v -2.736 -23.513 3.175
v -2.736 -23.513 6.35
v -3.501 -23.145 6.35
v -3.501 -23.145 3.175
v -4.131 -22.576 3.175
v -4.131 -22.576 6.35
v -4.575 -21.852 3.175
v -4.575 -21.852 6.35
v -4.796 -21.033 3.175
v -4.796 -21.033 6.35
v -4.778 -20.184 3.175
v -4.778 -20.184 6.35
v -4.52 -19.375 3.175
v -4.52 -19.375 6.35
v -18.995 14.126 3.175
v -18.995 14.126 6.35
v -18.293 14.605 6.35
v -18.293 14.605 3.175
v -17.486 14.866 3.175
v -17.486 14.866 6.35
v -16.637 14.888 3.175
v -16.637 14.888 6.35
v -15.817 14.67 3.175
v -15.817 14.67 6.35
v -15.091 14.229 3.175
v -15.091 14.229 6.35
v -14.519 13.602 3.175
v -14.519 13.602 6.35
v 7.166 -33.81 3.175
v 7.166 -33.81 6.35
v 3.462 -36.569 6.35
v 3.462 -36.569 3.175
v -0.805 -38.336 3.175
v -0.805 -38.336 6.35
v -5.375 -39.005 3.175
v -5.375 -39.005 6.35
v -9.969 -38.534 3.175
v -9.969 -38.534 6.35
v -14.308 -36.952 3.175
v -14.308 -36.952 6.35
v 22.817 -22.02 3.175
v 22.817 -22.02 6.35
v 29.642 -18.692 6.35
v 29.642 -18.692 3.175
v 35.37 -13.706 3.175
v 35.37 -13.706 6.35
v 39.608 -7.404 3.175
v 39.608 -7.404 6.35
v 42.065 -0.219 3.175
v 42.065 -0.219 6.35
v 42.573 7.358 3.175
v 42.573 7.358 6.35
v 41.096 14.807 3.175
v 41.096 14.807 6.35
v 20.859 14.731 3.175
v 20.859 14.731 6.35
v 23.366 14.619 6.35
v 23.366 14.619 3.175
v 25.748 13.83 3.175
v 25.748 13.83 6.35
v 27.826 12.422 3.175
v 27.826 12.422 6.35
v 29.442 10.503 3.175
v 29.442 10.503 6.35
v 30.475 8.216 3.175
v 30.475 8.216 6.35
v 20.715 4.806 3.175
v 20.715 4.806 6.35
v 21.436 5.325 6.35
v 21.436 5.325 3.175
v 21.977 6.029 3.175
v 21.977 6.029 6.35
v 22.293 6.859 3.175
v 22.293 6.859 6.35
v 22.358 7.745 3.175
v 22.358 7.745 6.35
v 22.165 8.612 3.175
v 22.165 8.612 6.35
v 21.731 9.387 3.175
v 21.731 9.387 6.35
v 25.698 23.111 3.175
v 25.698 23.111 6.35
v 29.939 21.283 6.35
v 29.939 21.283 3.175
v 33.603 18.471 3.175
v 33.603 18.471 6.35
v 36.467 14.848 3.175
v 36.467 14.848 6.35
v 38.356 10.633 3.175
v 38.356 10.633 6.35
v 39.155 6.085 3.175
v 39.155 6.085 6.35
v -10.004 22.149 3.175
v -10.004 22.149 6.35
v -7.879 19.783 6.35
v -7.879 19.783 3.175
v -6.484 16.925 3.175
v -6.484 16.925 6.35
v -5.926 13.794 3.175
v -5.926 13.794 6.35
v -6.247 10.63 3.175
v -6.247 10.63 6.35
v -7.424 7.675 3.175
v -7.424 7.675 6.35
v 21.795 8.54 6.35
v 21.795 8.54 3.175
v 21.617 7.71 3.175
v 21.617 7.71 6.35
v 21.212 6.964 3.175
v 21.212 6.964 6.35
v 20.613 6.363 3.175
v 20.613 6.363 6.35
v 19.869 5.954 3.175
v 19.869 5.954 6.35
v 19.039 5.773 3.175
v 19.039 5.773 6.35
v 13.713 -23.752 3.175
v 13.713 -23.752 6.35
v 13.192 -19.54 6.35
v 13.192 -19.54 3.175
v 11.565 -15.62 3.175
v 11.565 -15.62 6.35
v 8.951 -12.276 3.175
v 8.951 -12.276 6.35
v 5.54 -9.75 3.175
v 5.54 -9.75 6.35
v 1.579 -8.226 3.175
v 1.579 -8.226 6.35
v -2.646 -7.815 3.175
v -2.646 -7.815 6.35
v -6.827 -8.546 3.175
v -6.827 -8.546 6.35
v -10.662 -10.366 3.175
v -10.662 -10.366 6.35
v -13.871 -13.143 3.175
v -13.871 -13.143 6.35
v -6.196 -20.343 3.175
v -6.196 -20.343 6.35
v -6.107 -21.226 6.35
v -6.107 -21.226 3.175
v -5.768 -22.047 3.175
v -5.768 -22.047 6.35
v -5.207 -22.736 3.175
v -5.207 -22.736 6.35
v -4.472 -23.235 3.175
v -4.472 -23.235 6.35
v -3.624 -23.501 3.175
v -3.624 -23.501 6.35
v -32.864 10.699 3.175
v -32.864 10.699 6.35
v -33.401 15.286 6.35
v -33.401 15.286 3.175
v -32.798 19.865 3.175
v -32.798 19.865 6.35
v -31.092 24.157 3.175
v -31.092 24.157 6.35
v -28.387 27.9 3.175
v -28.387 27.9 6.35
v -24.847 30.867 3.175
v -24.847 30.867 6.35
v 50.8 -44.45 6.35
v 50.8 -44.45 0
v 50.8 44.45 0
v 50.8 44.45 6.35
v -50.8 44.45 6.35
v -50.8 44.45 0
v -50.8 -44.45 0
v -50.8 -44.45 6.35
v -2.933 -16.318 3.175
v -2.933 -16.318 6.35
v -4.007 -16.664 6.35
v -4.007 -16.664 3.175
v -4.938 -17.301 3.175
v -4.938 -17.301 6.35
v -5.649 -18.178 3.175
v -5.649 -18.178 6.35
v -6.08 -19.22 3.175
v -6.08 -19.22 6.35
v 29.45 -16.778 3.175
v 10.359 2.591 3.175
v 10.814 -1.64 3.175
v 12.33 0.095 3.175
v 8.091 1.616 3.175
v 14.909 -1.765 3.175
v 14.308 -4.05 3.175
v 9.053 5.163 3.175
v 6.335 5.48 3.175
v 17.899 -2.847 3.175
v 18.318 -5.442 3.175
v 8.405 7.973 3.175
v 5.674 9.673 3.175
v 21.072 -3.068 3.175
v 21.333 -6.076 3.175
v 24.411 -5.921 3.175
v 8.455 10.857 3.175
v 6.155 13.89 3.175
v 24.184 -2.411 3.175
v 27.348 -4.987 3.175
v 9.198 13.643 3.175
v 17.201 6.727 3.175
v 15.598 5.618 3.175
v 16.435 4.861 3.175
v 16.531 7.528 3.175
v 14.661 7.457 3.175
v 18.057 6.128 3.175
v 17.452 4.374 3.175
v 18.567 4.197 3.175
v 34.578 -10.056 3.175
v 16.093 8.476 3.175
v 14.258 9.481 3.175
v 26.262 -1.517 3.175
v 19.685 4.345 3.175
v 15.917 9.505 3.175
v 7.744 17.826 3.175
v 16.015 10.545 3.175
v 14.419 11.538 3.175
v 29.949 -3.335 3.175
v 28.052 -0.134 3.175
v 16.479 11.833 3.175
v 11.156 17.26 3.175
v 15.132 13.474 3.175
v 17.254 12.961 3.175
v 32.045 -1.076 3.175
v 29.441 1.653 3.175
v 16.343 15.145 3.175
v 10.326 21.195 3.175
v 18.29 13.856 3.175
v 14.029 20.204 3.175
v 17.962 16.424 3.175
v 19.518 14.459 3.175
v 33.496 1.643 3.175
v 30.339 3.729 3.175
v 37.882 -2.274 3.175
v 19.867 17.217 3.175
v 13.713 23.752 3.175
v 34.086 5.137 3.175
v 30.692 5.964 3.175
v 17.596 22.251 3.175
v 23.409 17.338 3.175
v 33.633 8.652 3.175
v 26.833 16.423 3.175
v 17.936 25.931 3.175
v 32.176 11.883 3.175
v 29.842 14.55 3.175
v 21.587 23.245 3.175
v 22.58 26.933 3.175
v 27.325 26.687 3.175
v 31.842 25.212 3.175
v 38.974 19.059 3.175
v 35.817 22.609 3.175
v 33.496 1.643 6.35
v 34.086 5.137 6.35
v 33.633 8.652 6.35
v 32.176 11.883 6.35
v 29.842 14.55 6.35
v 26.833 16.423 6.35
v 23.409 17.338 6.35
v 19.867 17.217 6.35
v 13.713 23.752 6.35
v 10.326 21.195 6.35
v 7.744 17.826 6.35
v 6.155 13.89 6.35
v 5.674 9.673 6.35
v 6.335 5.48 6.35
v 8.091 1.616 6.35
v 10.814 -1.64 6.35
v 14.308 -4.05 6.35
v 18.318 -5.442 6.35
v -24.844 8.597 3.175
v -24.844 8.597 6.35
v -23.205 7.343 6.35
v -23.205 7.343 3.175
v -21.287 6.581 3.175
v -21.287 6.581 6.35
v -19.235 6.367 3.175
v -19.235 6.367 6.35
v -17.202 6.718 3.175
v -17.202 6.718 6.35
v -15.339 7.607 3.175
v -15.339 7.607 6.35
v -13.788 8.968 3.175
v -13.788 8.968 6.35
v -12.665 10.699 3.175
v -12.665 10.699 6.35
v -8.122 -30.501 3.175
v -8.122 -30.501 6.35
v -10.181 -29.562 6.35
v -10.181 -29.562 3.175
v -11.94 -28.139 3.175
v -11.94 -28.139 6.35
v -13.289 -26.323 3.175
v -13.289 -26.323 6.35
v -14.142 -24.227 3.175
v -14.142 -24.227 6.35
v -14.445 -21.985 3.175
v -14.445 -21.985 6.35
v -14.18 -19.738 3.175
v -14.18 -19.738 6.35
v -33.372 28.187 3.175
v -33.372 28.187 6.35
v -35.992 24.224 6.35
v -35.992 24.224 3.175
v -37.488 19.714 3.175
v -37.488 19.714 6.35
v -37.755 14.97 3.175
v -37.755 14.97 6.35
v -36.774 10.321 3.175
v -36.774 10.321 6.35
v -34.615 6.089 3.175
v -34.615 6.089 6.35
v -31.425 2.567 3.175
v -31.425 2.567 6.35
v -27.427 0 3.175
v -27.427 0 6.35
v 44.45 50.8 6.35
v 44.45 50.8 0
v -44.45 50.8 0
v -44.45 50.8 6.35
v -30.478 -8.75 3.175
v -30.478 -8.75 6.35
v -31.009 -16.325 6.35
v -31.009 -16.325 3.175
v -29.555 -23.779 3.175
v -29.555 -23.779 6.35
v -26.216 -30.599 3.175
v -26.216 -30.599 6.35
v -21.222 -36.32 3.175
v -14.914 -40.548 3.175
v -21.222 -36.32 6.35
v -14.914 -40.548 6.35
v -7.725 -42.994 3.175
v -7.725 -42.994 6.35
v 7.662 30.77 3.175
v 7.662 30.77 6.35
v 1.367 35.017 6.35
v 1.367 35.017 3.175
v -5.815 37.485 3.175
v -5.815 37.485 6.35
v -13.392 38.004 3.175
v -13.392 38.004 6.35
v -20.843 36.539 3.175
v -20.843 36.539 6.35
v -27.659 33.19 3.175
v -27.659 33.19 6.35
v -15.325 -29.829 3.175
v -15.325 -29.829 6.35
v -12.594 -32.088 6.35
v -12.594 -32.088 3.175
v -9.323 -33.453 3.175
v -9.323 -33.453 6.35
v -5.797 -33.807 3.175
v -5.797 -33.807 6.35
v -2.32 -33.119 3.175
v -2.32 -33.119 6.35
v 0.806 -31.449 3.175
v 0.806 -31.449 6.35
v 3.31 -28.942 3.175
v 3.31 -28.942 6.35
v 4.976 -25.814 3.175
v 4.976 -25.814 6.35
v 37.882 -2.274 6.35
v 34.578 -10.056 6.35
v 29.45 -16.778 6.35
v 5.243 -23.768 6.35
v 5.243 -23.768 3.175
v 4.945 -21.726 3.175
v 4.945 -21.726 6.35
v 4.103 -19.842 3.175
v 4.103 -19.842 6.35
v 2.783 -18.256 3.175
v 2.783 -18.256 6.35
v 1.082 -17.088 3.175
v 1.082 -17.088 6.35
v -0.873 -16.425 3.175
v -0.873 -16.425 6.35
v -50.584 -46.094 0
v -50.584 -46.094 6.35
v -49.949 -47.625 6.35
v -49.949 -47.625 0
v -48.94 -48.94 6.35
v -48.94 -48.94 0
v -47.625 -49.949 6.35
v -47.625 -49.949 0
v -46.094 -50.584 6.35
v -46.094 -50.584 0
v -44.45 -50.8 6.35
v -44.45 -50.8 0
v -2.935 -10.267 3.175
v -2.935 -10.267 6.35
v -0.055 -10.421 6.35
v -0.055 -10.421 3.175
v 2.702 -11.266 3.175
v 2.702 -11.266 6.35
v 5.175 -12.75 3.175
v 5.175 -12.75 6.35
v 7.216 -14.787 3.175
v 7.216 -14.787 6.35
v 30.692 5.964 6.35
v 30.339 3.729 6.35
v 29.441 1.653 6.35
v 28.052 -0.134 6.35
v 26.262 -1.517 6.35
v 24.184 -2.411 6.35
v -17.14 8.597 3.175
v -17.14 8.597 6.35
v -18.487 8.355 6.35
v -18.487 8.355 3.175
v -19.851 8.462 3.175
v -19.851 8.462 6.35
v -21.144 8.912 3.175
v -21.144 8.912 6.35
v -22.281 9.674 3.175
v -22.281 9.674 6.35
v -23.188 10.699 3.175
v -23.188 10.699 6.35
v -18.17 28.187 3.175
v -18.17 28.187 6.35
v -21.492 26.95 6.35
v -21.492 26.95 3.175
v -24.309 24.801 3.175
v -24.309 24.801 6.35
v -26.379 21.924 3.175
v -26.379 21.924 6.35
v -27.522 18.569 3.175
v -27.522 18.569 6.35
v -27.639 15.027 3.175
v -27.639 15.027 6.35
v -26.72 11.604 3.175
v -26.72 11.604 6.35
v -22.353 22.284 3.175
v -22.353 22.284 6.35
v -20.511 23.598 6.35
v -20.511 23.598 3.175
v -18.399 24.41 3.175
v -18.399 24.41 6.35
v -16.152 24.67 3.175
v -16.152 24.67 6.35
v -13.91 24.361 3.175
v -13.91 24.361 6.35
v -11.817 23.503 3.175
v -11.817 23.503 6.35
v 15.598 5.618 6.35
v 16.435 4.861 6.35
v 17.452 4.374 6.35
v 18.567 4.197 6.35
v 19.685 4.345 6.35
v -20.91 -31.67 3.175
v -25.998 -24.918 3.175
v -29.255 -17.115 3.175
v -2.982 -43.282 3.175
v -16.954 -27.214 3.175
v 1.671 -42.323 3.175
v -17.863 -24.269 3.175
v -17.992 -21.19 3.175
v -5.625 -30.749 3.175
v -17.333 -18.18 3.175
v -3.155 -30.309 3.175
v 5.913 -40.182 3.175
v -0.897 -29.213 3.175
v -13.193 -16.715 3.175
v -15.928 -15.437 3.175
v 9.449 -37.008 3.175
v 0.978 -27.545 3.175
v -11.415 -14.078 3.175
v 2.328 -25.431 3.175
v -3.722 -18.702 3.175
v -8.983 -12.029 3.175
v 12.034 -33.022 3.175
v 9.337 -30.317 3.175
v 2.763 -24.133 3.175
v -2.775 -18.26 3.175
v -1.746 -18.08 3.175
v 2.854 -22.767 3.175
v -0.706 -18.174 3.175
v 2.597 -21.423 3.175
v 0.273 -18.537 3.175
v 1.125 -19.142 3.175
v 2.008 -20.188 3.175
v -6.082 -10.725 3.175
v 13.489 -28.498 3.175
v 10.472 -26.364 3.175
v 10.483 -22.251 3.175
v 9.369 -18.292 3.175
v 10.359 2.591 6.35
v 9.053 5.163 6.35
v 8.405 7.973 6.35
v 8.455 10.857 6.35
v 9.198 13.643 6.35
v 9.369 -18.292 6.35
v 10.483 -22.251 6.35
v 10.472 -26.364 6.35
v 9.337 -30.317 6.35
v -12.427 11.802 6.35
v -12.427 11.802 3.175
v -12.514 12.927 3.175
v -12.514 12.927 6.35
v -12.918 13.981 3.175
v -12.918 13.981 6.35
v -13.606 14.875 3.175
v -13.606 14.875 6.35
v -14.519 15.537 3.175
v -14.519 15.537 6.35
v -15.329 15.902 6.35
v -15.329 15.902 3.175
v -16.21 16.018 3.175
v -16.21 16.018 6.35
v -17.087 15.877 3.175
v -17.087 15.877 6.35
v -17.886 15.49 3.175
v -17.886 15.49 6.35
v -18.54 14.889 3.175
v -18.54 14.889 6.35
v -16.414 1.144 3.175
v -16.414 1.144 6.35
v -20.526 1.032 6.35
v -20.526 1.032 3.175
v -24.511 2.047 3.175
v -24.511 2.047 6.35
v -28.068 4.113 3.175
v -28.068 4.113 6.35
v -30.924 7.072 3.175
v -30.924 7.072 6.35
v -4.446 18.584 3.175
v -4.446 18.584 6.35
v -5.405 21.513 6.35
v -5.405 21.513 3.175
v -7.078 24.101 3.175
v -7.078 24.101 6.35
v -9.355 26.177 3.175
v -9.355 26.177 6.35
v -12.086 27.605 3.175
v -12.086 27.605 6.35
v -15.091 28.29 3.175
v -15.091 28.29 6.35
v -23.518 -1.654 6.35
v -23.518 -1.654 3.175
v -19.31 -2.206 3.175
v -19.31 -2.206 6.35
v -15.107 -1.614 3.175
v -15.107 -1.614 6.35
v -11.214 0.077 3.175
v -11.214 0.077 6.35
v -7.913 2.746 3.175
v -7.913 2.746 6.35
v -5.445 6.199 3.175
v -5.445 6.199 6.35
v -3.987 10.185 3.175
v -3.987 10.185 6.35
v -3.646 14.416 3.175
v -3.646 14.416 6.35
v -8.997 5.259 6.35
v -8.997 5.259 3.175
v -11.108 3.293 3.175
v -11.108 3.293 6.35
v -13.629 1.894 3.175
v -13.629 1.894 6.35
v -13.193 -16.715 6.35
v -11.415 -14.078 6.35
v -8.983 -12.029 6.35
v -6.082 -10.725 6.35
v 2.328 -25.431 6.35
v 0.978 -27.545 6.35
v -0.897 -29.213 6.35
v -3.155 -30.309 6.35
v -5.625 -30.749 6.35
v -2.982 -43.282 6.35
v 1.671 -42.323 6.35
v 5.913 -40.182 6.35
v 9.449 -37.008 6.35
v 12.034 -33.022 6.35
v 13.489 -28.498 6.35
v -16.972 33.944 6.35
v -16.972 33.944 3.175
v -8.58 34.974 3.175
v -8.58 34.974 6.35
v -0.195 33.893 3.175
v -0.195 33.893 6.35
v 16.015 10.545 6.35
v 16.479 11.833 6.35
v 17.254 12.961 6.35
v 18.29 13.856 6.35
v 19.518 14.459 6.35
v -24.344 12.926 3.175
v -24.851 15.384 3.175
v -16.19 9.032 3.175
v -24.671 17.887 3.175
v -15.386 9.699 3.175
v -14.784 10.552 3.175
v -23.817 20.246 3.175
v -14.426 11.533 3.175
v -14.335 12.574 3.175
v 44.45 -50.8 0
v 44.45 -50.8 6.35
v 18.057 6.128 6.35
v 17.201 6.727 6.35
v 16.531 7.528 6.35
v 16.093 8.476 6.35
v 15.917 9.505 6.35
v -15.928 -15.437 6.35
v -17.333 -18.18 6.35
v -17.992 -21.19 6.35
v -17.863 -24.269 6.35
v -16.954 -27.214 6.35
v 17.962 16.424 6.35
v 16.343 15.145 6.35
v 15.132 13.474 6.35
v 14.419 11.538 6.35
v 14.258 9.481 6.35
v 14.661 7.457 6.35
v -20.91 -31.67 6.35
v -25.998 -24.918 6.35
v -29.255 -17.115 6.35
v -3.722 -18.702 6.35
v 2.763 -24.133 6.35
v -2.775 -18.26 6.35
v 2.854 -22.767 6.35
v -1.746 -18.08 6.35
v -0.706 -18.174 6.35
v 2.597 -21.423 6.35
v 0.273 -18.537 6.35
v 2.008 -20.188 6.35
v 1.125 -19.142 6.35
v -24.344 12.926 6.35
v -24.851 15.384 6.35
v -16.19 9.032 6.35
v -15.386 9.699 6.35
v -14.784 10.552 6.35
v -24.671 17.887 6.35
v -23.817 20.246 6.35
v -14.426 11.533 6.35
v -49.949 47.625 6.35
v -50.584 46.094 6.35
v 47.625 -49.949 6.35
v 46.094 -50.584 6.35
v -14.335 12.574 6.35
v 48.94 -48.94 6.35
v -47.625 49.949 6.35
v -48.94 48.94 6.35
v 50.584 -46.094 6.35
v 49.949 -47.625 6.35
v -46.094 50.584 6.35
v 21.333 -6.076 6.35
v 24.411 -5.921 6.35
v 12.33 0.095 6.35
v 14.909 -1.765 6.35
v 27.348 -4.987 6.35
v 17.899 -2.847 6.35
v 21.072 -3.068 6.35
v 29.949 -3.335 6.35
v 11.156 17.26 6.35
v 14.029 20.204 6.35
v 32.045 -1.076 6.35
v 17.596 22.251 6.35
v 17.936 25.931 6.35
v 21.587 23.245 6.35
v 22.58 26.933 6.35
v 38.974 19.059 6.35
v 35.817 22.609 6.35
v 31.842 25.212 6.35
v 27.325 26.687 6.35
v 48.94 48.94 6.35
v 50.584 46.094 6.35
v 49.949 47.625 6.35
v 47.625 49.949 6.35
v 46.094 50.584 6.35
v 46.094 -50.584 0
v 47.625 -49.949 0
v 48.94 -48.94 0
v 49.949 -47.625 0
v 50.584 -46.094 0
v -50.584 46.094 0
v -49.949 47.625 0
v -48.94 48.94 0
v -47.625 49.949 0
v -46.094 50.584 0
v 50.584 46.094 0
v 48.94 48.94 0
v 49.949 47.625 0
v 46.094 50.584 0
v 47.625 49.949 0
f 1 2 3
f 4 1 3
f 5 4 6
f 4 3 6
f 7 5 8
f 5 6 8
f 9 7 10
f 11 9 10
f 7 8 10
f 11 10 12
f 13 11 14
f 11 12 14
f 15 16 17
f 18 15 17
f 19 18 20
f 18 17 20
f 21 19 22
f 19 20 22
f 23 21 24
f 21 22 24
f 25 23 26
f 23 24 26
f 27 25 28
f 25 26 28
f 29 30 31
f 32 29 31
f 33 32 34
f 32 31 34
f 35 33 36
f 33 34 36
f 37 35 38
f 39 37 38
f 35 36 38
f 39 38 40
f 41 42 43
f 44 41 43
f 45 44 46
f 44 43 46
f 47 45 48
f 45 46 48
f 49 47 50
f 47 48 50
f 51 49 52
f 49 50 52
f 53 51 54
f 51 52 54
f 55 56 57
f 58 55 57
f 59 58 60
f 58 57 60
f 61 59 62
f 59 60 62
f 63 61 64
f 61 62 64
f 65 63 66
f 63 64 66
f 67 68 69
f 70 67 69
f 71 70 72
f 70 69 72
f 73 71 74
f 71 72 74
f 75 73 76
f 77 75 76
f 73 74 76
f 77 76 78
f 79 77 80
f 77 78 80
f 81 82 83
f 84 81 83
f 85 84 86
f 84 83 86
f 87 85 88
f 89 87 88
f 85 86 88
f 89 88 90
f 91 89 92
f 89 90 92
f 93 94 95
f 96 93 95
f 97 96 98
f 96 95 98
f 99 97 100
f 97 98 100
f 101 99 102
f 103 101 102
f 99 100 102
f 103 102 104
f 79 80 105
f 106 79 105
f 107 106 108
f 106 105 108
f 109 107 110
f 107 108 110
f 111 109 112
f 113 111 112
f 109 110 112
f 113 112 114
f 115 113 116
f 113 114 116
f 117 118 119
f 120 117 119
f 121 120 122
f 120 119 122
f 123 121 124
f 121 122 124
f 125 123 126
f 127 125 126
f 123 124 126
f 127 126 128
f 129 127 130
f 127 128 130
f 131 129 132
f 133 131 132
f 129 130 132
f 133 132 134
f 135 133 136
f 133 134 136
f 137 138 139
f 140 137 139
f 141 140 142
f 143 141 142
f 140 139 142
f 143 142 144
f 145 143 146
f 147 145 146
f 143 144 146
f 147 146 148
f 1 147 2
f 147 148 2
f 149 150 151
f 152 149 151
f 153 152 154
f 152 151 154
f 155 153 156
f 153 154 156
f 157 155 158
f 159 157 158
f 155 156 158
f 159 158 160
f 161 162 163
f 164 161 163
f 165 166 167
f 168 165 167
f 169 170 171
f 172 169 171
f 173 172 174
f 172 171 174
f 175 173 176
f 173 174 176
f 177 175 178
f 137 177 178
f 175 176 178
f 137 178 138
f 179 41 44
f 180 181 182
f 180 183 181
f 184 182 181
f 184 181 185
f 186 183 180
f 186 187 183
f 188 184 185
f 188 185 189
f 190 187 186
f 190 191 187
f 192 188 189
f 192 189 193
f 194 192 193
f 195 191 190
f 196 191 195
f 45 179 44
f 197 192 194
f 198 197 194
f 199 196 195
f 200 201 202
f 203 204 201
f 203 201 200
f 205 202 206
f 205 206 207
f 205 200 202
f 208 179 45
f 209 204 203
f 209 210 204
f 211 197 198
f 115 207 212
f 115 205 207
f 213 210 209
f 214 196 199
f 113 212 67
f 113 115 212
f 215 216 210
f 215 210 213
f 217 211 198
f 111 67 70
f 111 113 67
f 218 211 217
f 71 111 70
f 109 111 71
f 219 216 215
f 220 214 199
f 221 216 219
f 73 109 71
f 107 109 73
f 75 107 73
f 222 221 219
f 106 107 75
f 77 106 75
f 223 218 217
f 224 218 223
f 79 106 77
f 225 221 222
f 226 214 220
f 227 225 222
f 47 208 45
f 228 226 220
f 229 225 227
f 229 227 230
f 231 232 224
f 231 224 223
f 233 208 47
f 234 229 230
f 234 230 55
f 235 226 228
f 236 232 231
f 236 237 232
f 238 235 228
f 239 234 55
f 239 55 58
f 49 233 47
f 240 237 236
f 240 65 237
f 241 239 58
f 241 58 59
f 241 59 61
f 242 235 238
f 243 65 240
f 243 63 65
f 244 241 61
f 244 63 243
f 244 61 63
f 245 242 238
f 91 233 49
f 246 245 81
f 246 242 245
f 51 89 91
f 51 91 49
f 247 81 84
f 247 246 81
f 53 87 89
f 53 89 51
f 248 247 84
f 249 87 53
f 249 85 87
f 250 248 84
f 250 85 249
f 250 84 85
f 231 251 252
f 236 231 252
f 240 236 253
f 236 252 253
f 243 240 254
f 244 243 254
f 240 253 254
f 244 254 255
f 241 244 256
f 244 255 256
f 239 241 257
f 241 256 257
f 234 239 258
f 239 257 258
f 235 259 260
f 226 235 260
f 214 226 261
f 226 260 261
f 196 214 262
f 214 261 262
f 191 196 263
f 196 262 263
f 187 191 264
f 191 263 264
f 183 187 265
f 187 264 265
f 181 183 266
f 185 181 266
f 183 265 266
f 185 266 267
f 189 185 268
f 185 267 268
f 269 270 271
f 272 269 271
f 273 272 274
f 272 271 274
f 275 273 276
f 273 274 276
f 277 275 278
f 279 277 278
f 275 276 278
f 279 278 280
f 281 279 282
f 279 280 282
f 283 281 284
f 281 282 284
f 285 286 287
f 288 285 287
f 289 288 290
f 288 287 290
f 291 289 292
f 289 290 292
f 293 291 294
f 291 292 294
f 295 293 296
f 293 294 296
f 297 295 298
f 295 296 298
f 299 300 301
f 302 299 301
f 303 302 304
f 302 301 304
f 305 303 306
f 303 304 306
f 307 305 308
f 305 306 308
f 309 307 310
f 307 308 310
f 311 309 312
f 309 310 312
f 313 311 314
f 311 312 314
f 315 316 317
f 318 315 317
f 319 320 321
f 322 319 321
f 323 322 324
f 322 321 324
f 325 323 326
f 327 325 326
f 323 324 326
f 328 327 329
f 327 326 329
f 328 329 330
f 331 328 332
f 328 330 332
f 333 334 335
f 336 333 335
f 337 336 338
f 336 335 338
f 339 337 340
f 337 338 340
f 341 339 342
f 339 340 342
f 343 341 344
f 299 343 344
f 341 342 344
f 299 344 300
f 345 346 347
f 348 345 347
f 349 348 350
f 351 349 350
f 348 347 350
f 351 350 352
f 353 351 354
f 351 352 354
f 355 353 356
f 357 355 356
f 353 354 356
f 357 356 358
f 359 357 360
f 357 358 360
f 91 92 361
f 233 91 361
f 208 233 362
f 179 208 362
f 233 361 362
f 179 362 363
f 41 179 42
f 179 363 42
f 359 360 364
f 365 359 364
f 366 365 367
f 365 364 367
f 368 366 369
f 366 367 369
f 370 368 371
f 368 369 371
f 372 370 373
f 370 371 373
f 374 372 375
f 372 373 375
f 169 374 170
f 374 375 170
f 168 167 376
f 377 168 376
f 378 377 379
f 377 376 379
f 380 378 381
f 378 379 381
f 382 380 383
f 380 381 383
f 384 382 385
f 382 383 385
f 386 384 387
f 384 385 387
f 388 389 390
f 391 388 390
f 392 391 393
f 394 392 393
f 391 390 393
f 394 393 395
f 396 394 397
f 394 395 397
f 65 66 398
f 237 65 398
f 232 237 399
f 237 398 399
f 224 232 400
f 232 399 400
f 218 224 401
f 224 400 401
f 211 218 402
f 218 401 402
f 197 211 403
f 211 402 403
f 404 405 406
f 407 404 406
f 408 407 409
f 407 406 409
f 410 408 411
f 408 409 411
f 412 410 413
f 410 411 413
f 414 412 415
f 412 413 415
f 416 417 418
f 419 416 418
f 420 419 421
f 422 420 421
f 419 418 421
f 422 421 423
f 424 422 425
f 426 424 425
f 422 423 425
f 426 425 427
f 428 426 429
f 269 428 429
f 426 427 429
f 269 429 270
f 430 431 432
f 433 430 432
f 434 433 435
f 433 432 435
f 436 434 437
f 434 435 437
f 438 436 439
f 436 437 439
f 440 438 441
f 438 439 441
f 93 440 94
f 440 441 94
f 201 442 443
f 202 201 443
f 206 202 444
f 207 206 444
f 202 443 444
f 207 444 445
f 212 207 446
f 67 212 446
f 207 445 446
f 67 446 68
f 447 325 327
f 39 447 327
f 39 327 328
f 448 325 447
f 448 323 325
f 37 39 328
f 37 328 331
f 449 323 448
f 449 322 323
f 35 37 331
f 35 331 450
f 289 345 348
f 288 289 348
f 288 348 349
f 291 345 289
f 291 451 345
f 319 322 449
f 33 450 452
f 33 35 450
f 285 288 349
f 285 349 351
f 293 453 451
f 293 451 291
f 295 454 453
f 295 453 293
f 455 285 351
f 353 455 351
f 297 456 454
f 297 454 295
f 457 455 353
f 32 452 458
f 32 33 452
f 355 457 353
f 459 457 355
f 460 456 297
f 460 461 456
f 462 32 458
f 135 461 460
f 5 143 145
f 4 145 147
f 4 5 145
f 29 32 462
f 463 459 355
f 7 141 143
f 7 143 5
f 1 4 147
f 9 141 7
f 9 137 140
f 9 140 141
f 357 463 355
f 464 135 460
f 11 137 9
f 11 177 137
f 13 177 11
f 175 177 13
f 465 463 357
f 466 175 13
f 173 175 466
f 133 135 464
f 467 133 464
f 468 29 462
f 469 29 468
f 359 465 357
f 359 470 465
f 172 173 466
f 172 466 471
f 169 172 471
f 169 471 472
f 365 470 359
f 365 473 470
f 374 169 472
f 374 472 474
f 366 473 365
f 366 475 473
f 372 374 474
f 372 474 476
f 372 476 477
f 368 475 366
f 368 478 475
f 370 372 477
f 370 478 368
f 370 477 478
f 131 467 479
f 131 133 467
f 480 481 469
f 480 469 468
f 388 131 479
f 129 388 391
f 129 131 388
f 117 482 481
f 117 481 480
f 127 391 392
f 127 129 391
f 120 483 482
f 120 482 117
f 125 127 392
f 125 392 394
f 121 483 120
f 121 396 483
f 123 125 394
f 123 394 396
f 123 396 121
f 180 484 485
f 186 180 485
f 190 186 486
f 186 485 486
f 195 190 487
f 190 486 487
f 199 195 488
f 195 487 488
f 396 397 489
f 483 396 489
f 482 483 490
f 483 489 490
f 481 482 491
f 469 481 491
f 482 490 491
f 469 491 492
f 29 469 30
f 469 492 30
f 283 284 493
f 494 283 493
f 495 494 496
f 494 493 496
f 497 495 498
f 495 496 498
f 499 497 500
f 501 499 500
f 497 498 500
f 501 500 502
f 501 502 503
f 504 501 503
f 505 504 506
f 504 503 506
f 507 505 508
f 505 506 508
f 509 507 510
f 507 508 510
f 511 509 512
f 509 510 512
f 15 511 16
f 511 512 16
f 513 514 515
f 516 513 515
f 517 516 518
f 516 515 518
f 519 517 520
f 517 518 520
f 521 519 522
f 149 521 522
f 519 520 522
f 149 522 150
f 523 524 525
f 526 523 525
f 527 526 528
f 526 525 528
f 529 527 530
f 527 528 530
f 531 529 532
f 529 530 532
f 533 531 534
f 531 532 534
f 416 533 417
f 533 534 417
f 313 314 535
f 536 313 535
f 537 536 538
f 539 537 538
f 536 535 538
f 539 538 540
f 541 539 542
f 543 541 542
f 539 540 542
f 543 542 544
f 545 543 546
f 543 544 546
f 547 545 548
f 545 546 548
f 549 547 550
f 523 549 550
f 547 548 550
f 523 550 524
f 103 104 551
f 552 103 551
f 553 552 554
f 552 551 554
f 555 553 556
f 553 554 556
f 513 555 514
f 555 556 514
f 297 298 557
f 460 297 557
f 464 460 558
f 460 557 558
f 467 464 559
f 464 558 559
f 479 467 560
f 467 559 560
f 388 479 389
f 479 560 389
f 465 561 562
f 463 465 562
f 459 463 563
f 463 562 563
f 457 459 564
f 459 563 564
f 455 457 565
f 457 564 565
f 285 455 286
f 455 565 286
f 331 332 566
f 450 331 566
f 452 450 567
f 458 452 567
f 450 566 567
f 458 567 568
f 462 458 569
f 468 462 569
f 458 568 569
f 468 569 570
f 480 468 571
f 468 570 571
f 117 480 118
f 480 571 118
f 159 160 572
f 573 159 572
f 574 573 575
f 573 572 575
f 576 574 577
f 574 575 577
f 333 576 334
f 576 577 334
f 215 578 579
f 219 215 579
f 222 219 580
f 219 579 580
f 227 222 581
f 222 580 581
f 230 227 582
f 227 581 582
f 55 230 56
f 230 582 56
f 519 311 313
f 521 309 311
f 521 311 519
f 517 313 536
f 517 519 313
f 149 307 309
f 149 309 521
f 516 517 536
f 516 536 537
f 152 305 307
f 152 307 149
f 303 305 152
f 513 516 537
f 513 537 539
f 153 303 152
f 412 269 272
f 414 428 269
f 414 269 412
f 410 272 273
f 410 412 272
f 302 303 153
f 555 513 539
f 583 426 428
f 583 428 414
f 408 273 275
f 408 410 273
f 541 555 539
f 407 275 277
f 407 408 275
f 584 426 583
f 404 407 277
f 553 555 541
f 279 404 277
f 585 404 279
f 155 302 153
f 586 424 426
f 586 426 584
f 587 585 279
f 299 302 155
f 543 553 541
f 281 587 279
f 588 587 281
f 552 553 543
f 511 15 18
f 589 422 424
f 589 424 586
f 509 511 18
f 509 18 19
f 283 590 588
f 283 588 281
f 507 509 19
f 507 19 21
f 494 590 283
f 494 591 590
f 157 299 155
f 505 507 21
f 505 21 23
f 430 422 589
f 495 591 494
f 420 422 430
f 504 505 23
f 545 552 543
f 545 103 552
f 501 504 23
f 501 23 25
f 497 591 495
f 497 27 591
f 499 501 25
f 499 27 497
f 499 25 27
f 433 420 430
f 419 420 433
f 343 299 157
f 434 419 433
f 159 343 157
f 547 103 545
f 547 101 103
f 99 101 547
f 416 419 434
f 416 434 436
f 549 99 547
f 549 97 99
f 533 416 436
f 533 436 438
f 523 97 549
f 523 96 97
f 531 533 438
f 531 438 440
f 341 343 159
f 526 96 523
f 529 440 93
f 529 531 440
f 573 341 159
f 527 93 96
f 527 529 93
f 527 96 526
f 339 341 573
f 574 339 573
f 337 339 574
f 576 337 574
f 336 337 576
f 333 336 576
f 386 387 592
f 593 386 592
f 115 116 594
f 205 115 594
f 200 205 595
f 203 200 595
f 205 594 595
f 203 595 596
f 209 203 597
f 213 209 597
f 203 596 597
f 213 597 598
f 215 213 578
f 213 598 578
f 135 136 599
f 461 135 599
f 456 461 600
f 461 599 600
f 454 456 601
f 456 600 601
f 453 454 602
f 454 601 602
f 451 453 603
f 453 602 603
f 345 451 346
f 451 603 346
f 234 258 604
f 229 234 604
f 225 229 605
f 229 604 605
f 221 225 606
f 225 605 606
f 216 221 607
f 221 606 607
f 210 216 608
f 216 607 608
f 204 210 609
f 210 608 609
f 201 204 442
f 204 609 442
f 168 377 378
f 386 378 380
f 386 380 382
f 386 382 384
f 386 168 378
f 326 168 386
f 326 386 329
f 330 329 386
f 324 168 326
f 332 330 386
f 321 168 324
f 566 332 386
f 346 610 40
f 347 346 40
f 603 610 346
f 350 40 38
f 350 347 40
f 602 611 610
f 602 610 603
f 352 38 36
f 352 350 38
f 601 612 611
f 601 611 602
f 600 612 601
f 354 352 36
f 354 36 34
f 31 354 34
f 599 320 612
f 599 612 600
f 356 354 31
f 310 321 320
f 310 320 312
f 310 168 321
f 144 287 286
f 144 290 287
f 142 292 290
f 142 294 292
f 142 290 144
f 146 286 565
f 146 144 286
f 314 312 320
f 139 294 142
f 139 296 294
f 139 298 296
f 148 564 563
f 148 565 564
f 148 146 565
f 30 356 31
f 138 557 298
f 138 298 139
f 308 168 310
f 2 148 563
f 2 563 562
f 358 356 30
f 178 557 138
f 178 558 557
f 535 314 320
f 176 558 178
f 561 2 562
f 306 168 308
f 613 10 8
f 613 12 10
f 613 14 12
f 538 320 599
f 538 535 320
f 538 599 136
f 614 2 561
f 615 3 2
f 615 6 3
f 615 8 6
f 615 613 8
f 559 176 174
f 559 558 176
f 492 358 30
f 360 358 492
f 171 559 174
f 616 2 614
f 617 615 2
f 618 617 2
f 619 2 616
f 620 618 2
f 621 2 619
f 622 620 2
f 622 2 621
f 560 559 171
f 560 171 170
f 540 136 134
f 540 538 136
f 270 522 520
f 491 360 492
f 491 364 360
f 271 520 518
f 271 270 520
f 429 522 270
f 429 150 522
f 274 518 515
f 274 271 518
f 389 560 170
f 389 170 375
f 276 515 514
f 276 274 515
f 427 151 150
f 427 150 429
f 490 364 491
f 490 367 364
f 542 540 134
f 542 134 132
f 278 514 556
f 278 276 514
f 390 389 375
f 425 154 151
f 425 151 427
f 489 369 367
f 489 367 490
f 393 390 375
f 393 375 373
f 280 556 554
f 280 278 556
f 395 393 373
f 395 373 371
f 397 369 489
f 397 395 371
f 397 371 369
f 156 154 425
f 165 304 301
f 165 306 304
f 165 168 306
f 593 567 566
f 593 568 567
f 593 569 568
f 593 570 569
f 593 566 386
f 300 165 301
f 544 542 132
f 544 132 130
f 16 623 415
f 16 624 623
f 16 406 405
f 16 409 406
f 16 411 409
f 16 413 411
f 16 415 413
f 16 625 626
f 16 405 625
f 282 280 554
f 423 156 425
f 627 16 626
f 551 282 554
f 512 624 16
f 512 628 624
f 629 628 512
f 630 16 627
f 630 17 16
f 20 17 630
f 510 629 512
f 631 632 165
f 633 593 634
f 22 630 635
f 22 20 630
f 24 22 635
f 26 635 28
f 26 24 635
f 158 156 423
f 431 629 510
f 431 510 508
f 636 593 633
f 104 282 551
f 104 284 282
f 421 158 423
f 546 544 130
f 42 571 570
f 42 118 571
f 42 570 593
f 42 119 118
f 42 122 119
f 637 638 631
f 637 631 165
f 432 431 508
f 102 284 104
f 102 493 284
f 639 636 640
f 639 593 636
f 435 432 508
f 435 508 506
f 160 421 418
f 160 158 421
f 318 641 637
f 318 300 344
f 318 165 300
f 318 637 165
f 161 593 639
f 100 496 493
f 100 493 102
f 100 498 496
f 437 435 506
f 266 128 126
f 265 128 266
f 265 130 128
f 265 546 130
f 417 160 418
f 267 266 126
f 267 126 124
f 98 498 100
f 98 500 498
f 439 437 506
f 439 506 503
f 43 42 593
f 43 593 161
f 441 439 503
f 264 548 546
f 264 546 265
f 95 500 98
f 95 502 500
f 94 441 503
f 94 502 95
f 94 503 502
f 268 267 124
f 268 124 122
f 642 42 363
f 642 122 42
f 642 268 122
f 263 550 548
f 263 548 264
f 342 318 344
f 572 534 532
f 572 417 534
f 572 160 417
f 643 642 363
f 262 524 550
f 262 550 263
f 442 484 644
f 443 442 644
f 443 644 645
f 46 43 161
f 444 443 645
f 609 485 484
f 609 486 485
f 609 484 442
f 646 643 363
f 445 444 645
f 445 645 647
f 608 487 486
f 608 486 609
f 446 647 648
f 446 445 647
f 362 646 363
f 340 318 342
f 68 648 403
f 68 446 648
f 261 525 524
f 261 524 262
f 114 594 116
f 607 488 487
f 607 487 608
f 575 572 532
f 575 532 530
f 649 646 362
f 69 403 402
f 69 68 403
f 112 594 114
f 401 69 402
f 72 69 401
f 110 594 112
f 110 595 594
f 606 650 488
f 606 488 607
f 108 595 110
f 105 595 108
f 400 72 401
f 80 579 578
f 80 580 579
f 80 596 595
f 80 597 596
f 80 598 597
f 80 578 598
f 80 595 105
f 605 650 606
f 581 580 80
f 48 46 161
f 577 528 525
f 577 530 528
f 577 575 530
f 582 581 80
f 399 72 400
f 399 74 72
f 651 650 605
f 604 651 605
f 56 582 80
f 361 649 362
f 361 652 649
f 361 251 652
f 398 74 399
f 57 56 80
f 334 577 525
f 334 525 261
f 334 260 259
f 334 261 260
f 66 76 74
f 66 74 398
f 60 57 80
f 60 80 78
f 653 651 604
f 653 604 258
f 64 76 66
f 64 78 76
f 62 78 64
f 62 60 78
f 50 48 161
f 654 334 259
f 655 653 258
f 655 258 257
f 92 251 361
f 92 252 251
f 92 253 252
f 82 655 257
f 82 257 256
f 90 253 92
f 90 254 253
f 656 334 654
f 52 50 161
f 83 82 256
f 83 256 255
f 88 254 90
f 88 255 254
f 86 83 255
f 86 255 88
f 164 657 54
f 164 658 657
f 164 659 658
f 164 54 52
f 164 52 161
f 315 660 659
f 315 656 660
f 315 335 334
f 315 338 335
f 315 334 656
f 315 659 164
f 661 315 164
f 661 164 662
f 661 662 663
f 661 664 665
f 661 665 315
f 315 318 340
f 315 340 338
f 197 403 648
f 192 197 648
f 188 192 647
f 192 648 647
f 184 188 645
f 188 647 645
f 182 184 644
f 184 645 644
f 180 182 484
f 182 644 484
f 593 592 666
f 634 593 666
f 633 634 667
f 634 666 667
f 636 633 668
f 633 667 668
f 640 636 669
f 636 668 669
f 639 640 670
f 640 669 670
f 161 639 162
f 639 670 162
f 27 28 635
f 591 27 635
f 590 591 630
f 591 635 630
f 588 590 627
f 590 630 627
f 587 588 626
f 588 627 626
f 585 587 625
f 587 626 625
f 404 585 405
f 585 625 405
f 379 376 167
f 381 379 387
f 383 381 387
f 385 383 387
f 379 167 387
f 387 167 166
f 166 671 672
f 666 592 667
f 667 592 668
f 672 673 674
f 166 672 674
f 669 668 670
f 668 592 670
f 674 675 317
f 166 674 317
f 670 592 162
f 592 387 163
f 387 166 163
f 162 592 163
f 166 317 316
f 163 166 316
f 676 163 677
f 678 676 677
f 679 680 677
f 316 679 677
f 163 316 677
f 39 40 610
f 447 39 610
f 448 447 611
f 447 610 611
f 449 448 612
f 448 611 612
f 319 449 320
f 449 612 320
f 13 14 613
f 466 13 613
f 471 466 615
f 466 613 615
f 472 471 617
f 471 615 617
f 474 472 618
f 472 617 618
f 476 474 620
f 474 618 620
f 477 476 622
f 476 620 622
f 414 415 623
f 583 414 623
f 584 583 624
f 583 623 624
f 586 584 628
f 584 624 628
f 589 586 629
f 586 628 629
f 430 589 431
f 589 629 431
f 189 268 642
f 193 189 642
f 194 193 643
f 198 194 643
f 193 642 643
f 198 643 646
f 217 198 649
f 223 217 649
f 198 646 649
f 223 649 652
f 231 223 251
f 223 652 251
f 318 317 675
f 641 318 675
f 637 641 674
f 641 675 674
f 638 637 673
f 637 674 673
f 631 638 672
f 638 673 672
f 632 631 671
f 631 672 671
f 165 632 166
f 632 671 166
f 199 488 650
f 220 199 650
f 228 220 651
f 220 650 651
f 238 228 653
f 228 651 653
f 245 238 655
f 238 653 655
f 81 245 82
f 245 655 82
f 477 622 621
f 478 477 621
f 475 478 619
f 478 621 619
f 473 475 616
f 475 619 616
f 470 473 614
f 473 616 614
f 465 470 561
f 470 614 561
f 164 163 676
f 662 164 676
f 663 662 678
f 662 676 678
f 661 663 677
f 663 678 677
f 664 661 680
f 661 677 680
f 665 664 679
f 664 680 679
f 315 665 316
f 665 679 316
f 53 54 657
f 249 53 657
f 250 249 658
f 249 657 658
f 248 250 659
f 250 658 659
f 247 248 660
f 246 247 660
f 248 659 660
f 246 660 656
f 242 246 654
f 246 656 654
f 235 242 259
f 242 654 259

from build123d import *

# Parameters (mm, degrees)
F1_DEPTH = 6.35
F3_DEPTH = 3.175


with BuildPart() as f1:
    # F0 (on Top) → F1 (new body)
    with BuildSketch(Plane.XY):
        with BuildLine():
            Line((44.45, 50.8), (-44.45, 50.8))
            ThreePointArc((-44.45, 50.8), (-48.940128, 48.940128), (-50.8, 44.45))
            Line((-50.8, 44.45), (-50.8, -44.45))
            ThreePointArc((-50.8, -44.45), (-48.940128, -48.940128), (-44.45, -50.8))
            Line((-44.45, -50.8), (44.45, -50.8))
            ThreePointArc((44.45, -50.8), (48.940128, -48.940128), (50.8, -44.45))
            Line((50.8, -44.45), (50.8, 44.45))
            ThreePointArc((50.8, 44.45), (48.940128, 48.940128), (44.45, 50.8))
        make_face()
    extrude(amount=F1_DEPTH)

    # F2 (on face) → F3 (cut)
    with BuildSketch(Plane.XY.offset(6.35)):
        with BuildLine():
            ThreePointArc((-24.847122, 30.86718), (-8.580237, 34.973614), (7.661782, 30.769903))
            ThreePointArc((7.661782, 30.769903), (-13.391629, 38.003846), (-33.371605, 28.186688))
            ThreePointArc((-33.371605, 28.186688), (-37.418416, 12.612971), (-27.426904, 0))
            ThreePointArc((-27.426904, 0), (-9.473393, 1.300027), (-4.446225, 18.584304))
            ThreePointArc((-4.446225, 18.584304), (-9.355194, 26.176966), (-18.170381, 28.186688))
            ThreePointArc((-18.170381, 28.186688), (-27.074817, 20.28871), (-24.843689, 8.597298))
            ThreePointArc((-24.843689, 8.597298), (-18.2062, 6.472593), (-12.664793, 10.699108))
            ThreePointArc((-12.664793, 10.699108), (-12.67809, 13.468506), (-14.519384, 15.537172))
            ThreePointArc((-14.519384, 15.537172), (-17.08667, 15.877181), (-18.994594, 14.12607))
            ThreePointArc((-18.994594, 14.12607), (-16.63705, 14.888107), (-14.519384, 13.601947))
            ThreePointArc((-14.519384, 13.601947), (-14.784471, 10.552305), (-17.140003, 8.597298))
            ThreePointArc((-17.140003, 8.597298), (-20.512291, 8.645462), (-23.187581, 10.699108))
            ThreePointArc((-23.187581, 10.699108), (-24.847122, 16.641338), (-22.353067, 22.284373))
            ThreePointArc((-22.353067, 22.284373), (-16.15161, 24.669828), (-10.003858, 22.149192))
            ThreePointArc((-10.003858, 22.149192), (-6.096197, 15.378887), (-7.423557, 7.675318))
            ThreePointArc((-7.423557, 7.675318), (-11.107583, 3.292778), (-16.414292, 1.143932))
            ThreePointArc((-16.414292, 1.143932), (-26.36106, 2.956962), (-32.86371, 10.699108))
            ThreePointArc((-32.86371, 10.699108), (-32.077882, 22.064039), (-24.847122, 30.86718))
        make_face()
        with BuildLine():
            ThreePointArc((-14.179834, -19.738191), (-10.270408, -12.968905), (-2.935242, -10.266648))
            ThreePointArc((-2.935242, -10.266648), (2.702162, -11.265838), (7.216472, -14.78716))
            ThreePointArc((7.216472, -14.78716), (10.619726, -24.307829), (7.166156, -33.810362))
            ThreePointArc((7.166156, -33.810362), (-3.069077, -38.81228), (-14.308201, -36.951829))
            ThreePointArc((-14.308201, -36.951829), (-25.997919, -24.91751), (-30.478409, -8.749654))
            ThreePointArc((-30.478409, -8.749654), (-26.216482, -30.599414), (-7.724586, -42.994002))
            ThreePointArc((-7.724586, -42.994002), (7.786055, -38.711784), (13.713452, -23.752396))
            ThreePointArc((13.713452, -23.752396), (3.61084, -8.854213), (-13.871366, -13.142696))
            ThreePointArc((-13.871366, -13.142696), (-17.992321, -21.190319), (-15.325198, -29.829356))
            ThreePointArc((-15.325198, -29.829356), (-4.033129, -33.591834), (4.976366, -25.813915))
            ThreePointArc((4.976366, -25.813915), (3.49767, -19.003328), (-2.933303, -16.317587))
            ThreePointArc((-2.933303, -16.317587), (-5.325023, -17.713801), (-6.195893, -20.342741))
            ThreePointArc((-6.195893, -20.342741), (-5.206707, -22.736081), (-2.736238, -23.512836))
            ThreePointArc((-2.736238, -23.512836), (-4.574954, -21.852161), (-4.519939, -19.375129))
            ThreePointArc((-4.519939, -19.375129), (-1.746329, -18.07988), (1.124523, -19.142327))
            ThreePointArc((1.124523, -19.142327), (2.768956, -22.086896), (2.328091, -25.430589))
            ThreePointArc((2.328091, -25.430589), (-1.98826, -29.838908), (-8.1223, -30.500511))
            ThreePointArc((-8.1223, -30.500511), (-13.288892, -26.322619), (-14.179834, -19.738191))
        make_face()
        with BuildLine():
            ThreePointArc((24.183692, -2.411001), (16.366605, -2.409982), (10.358799, 2.59133))
            ThreePointArc((10.358799, 2.59133), (8.405421, 7.97306), (9.19782, 13.643228))
            ThreePointArc((9.19782, 13.643228), (15.741335, 21.350867), (25.697555, 23.111254))
            ThreePointArc((25.697555, 23.111254), (35.146959, 16.748241), (39.155323, 6.084649))
            ThreePointArc((39.155323, 6.084649), (34.578156, -10.056104), (22.816627, -22.020249))
            ThreePointArc((22.816627, -22.020249), (39.60811, -7.404432), (41.096191, 14.807314))
            ThreePointArc((41.096191, 14.807314), (29.632361, 26.098813), (13.713452, 23.752396))
            ThreePointArc((13.713452, 23.752396), (5.862553, 7.554185), (18.317592, -5.441608))
            ThreePointArc((18.317592, -5.441608), (27.347515, -4.986647), (33.495579, 1.642667))
            ThreePointArc((33.495579, 1.642667), (31.107946, 13.303124), (19.867323, 17.216617))
            ThreePointArc((19.867323, 17.216617), (14.70853, 12.530736), (15.598096, 5.618478))
            ThreePointArc((15.598096, 5.618478), (18.003113, 4.245295), (20.715277, 4.80557))
            ThreePointArc((20.715277, 4.80557), (22.293377, 6.8589), (21.730832, 9.386766))
            ThreePointArc((21.730832, 9.386766), (21.212004, 6.964054), (19.039323, 5.773182))
            ThreePointArc((19.039323, 5.773182), (16.5308, 7.527575), (16.01548, 10.545029))
            ThreePointArc((16.01548, 10.545029), (17.743335, 13.441434), (20.85949, 14.73148))
            ThreePointArc((20.85949, 14.73148), (26.835382, 13.19757), (30.475367, 8.216137))
            ThreePointArc((30.475367, 8.216137), (29.440503, 1.652791), (24.183692, -2.411001))
        make_face()
    extrude(amount=-F3_DEPTH, mode=Mode.SUBTRACT)


solid = f1.part
